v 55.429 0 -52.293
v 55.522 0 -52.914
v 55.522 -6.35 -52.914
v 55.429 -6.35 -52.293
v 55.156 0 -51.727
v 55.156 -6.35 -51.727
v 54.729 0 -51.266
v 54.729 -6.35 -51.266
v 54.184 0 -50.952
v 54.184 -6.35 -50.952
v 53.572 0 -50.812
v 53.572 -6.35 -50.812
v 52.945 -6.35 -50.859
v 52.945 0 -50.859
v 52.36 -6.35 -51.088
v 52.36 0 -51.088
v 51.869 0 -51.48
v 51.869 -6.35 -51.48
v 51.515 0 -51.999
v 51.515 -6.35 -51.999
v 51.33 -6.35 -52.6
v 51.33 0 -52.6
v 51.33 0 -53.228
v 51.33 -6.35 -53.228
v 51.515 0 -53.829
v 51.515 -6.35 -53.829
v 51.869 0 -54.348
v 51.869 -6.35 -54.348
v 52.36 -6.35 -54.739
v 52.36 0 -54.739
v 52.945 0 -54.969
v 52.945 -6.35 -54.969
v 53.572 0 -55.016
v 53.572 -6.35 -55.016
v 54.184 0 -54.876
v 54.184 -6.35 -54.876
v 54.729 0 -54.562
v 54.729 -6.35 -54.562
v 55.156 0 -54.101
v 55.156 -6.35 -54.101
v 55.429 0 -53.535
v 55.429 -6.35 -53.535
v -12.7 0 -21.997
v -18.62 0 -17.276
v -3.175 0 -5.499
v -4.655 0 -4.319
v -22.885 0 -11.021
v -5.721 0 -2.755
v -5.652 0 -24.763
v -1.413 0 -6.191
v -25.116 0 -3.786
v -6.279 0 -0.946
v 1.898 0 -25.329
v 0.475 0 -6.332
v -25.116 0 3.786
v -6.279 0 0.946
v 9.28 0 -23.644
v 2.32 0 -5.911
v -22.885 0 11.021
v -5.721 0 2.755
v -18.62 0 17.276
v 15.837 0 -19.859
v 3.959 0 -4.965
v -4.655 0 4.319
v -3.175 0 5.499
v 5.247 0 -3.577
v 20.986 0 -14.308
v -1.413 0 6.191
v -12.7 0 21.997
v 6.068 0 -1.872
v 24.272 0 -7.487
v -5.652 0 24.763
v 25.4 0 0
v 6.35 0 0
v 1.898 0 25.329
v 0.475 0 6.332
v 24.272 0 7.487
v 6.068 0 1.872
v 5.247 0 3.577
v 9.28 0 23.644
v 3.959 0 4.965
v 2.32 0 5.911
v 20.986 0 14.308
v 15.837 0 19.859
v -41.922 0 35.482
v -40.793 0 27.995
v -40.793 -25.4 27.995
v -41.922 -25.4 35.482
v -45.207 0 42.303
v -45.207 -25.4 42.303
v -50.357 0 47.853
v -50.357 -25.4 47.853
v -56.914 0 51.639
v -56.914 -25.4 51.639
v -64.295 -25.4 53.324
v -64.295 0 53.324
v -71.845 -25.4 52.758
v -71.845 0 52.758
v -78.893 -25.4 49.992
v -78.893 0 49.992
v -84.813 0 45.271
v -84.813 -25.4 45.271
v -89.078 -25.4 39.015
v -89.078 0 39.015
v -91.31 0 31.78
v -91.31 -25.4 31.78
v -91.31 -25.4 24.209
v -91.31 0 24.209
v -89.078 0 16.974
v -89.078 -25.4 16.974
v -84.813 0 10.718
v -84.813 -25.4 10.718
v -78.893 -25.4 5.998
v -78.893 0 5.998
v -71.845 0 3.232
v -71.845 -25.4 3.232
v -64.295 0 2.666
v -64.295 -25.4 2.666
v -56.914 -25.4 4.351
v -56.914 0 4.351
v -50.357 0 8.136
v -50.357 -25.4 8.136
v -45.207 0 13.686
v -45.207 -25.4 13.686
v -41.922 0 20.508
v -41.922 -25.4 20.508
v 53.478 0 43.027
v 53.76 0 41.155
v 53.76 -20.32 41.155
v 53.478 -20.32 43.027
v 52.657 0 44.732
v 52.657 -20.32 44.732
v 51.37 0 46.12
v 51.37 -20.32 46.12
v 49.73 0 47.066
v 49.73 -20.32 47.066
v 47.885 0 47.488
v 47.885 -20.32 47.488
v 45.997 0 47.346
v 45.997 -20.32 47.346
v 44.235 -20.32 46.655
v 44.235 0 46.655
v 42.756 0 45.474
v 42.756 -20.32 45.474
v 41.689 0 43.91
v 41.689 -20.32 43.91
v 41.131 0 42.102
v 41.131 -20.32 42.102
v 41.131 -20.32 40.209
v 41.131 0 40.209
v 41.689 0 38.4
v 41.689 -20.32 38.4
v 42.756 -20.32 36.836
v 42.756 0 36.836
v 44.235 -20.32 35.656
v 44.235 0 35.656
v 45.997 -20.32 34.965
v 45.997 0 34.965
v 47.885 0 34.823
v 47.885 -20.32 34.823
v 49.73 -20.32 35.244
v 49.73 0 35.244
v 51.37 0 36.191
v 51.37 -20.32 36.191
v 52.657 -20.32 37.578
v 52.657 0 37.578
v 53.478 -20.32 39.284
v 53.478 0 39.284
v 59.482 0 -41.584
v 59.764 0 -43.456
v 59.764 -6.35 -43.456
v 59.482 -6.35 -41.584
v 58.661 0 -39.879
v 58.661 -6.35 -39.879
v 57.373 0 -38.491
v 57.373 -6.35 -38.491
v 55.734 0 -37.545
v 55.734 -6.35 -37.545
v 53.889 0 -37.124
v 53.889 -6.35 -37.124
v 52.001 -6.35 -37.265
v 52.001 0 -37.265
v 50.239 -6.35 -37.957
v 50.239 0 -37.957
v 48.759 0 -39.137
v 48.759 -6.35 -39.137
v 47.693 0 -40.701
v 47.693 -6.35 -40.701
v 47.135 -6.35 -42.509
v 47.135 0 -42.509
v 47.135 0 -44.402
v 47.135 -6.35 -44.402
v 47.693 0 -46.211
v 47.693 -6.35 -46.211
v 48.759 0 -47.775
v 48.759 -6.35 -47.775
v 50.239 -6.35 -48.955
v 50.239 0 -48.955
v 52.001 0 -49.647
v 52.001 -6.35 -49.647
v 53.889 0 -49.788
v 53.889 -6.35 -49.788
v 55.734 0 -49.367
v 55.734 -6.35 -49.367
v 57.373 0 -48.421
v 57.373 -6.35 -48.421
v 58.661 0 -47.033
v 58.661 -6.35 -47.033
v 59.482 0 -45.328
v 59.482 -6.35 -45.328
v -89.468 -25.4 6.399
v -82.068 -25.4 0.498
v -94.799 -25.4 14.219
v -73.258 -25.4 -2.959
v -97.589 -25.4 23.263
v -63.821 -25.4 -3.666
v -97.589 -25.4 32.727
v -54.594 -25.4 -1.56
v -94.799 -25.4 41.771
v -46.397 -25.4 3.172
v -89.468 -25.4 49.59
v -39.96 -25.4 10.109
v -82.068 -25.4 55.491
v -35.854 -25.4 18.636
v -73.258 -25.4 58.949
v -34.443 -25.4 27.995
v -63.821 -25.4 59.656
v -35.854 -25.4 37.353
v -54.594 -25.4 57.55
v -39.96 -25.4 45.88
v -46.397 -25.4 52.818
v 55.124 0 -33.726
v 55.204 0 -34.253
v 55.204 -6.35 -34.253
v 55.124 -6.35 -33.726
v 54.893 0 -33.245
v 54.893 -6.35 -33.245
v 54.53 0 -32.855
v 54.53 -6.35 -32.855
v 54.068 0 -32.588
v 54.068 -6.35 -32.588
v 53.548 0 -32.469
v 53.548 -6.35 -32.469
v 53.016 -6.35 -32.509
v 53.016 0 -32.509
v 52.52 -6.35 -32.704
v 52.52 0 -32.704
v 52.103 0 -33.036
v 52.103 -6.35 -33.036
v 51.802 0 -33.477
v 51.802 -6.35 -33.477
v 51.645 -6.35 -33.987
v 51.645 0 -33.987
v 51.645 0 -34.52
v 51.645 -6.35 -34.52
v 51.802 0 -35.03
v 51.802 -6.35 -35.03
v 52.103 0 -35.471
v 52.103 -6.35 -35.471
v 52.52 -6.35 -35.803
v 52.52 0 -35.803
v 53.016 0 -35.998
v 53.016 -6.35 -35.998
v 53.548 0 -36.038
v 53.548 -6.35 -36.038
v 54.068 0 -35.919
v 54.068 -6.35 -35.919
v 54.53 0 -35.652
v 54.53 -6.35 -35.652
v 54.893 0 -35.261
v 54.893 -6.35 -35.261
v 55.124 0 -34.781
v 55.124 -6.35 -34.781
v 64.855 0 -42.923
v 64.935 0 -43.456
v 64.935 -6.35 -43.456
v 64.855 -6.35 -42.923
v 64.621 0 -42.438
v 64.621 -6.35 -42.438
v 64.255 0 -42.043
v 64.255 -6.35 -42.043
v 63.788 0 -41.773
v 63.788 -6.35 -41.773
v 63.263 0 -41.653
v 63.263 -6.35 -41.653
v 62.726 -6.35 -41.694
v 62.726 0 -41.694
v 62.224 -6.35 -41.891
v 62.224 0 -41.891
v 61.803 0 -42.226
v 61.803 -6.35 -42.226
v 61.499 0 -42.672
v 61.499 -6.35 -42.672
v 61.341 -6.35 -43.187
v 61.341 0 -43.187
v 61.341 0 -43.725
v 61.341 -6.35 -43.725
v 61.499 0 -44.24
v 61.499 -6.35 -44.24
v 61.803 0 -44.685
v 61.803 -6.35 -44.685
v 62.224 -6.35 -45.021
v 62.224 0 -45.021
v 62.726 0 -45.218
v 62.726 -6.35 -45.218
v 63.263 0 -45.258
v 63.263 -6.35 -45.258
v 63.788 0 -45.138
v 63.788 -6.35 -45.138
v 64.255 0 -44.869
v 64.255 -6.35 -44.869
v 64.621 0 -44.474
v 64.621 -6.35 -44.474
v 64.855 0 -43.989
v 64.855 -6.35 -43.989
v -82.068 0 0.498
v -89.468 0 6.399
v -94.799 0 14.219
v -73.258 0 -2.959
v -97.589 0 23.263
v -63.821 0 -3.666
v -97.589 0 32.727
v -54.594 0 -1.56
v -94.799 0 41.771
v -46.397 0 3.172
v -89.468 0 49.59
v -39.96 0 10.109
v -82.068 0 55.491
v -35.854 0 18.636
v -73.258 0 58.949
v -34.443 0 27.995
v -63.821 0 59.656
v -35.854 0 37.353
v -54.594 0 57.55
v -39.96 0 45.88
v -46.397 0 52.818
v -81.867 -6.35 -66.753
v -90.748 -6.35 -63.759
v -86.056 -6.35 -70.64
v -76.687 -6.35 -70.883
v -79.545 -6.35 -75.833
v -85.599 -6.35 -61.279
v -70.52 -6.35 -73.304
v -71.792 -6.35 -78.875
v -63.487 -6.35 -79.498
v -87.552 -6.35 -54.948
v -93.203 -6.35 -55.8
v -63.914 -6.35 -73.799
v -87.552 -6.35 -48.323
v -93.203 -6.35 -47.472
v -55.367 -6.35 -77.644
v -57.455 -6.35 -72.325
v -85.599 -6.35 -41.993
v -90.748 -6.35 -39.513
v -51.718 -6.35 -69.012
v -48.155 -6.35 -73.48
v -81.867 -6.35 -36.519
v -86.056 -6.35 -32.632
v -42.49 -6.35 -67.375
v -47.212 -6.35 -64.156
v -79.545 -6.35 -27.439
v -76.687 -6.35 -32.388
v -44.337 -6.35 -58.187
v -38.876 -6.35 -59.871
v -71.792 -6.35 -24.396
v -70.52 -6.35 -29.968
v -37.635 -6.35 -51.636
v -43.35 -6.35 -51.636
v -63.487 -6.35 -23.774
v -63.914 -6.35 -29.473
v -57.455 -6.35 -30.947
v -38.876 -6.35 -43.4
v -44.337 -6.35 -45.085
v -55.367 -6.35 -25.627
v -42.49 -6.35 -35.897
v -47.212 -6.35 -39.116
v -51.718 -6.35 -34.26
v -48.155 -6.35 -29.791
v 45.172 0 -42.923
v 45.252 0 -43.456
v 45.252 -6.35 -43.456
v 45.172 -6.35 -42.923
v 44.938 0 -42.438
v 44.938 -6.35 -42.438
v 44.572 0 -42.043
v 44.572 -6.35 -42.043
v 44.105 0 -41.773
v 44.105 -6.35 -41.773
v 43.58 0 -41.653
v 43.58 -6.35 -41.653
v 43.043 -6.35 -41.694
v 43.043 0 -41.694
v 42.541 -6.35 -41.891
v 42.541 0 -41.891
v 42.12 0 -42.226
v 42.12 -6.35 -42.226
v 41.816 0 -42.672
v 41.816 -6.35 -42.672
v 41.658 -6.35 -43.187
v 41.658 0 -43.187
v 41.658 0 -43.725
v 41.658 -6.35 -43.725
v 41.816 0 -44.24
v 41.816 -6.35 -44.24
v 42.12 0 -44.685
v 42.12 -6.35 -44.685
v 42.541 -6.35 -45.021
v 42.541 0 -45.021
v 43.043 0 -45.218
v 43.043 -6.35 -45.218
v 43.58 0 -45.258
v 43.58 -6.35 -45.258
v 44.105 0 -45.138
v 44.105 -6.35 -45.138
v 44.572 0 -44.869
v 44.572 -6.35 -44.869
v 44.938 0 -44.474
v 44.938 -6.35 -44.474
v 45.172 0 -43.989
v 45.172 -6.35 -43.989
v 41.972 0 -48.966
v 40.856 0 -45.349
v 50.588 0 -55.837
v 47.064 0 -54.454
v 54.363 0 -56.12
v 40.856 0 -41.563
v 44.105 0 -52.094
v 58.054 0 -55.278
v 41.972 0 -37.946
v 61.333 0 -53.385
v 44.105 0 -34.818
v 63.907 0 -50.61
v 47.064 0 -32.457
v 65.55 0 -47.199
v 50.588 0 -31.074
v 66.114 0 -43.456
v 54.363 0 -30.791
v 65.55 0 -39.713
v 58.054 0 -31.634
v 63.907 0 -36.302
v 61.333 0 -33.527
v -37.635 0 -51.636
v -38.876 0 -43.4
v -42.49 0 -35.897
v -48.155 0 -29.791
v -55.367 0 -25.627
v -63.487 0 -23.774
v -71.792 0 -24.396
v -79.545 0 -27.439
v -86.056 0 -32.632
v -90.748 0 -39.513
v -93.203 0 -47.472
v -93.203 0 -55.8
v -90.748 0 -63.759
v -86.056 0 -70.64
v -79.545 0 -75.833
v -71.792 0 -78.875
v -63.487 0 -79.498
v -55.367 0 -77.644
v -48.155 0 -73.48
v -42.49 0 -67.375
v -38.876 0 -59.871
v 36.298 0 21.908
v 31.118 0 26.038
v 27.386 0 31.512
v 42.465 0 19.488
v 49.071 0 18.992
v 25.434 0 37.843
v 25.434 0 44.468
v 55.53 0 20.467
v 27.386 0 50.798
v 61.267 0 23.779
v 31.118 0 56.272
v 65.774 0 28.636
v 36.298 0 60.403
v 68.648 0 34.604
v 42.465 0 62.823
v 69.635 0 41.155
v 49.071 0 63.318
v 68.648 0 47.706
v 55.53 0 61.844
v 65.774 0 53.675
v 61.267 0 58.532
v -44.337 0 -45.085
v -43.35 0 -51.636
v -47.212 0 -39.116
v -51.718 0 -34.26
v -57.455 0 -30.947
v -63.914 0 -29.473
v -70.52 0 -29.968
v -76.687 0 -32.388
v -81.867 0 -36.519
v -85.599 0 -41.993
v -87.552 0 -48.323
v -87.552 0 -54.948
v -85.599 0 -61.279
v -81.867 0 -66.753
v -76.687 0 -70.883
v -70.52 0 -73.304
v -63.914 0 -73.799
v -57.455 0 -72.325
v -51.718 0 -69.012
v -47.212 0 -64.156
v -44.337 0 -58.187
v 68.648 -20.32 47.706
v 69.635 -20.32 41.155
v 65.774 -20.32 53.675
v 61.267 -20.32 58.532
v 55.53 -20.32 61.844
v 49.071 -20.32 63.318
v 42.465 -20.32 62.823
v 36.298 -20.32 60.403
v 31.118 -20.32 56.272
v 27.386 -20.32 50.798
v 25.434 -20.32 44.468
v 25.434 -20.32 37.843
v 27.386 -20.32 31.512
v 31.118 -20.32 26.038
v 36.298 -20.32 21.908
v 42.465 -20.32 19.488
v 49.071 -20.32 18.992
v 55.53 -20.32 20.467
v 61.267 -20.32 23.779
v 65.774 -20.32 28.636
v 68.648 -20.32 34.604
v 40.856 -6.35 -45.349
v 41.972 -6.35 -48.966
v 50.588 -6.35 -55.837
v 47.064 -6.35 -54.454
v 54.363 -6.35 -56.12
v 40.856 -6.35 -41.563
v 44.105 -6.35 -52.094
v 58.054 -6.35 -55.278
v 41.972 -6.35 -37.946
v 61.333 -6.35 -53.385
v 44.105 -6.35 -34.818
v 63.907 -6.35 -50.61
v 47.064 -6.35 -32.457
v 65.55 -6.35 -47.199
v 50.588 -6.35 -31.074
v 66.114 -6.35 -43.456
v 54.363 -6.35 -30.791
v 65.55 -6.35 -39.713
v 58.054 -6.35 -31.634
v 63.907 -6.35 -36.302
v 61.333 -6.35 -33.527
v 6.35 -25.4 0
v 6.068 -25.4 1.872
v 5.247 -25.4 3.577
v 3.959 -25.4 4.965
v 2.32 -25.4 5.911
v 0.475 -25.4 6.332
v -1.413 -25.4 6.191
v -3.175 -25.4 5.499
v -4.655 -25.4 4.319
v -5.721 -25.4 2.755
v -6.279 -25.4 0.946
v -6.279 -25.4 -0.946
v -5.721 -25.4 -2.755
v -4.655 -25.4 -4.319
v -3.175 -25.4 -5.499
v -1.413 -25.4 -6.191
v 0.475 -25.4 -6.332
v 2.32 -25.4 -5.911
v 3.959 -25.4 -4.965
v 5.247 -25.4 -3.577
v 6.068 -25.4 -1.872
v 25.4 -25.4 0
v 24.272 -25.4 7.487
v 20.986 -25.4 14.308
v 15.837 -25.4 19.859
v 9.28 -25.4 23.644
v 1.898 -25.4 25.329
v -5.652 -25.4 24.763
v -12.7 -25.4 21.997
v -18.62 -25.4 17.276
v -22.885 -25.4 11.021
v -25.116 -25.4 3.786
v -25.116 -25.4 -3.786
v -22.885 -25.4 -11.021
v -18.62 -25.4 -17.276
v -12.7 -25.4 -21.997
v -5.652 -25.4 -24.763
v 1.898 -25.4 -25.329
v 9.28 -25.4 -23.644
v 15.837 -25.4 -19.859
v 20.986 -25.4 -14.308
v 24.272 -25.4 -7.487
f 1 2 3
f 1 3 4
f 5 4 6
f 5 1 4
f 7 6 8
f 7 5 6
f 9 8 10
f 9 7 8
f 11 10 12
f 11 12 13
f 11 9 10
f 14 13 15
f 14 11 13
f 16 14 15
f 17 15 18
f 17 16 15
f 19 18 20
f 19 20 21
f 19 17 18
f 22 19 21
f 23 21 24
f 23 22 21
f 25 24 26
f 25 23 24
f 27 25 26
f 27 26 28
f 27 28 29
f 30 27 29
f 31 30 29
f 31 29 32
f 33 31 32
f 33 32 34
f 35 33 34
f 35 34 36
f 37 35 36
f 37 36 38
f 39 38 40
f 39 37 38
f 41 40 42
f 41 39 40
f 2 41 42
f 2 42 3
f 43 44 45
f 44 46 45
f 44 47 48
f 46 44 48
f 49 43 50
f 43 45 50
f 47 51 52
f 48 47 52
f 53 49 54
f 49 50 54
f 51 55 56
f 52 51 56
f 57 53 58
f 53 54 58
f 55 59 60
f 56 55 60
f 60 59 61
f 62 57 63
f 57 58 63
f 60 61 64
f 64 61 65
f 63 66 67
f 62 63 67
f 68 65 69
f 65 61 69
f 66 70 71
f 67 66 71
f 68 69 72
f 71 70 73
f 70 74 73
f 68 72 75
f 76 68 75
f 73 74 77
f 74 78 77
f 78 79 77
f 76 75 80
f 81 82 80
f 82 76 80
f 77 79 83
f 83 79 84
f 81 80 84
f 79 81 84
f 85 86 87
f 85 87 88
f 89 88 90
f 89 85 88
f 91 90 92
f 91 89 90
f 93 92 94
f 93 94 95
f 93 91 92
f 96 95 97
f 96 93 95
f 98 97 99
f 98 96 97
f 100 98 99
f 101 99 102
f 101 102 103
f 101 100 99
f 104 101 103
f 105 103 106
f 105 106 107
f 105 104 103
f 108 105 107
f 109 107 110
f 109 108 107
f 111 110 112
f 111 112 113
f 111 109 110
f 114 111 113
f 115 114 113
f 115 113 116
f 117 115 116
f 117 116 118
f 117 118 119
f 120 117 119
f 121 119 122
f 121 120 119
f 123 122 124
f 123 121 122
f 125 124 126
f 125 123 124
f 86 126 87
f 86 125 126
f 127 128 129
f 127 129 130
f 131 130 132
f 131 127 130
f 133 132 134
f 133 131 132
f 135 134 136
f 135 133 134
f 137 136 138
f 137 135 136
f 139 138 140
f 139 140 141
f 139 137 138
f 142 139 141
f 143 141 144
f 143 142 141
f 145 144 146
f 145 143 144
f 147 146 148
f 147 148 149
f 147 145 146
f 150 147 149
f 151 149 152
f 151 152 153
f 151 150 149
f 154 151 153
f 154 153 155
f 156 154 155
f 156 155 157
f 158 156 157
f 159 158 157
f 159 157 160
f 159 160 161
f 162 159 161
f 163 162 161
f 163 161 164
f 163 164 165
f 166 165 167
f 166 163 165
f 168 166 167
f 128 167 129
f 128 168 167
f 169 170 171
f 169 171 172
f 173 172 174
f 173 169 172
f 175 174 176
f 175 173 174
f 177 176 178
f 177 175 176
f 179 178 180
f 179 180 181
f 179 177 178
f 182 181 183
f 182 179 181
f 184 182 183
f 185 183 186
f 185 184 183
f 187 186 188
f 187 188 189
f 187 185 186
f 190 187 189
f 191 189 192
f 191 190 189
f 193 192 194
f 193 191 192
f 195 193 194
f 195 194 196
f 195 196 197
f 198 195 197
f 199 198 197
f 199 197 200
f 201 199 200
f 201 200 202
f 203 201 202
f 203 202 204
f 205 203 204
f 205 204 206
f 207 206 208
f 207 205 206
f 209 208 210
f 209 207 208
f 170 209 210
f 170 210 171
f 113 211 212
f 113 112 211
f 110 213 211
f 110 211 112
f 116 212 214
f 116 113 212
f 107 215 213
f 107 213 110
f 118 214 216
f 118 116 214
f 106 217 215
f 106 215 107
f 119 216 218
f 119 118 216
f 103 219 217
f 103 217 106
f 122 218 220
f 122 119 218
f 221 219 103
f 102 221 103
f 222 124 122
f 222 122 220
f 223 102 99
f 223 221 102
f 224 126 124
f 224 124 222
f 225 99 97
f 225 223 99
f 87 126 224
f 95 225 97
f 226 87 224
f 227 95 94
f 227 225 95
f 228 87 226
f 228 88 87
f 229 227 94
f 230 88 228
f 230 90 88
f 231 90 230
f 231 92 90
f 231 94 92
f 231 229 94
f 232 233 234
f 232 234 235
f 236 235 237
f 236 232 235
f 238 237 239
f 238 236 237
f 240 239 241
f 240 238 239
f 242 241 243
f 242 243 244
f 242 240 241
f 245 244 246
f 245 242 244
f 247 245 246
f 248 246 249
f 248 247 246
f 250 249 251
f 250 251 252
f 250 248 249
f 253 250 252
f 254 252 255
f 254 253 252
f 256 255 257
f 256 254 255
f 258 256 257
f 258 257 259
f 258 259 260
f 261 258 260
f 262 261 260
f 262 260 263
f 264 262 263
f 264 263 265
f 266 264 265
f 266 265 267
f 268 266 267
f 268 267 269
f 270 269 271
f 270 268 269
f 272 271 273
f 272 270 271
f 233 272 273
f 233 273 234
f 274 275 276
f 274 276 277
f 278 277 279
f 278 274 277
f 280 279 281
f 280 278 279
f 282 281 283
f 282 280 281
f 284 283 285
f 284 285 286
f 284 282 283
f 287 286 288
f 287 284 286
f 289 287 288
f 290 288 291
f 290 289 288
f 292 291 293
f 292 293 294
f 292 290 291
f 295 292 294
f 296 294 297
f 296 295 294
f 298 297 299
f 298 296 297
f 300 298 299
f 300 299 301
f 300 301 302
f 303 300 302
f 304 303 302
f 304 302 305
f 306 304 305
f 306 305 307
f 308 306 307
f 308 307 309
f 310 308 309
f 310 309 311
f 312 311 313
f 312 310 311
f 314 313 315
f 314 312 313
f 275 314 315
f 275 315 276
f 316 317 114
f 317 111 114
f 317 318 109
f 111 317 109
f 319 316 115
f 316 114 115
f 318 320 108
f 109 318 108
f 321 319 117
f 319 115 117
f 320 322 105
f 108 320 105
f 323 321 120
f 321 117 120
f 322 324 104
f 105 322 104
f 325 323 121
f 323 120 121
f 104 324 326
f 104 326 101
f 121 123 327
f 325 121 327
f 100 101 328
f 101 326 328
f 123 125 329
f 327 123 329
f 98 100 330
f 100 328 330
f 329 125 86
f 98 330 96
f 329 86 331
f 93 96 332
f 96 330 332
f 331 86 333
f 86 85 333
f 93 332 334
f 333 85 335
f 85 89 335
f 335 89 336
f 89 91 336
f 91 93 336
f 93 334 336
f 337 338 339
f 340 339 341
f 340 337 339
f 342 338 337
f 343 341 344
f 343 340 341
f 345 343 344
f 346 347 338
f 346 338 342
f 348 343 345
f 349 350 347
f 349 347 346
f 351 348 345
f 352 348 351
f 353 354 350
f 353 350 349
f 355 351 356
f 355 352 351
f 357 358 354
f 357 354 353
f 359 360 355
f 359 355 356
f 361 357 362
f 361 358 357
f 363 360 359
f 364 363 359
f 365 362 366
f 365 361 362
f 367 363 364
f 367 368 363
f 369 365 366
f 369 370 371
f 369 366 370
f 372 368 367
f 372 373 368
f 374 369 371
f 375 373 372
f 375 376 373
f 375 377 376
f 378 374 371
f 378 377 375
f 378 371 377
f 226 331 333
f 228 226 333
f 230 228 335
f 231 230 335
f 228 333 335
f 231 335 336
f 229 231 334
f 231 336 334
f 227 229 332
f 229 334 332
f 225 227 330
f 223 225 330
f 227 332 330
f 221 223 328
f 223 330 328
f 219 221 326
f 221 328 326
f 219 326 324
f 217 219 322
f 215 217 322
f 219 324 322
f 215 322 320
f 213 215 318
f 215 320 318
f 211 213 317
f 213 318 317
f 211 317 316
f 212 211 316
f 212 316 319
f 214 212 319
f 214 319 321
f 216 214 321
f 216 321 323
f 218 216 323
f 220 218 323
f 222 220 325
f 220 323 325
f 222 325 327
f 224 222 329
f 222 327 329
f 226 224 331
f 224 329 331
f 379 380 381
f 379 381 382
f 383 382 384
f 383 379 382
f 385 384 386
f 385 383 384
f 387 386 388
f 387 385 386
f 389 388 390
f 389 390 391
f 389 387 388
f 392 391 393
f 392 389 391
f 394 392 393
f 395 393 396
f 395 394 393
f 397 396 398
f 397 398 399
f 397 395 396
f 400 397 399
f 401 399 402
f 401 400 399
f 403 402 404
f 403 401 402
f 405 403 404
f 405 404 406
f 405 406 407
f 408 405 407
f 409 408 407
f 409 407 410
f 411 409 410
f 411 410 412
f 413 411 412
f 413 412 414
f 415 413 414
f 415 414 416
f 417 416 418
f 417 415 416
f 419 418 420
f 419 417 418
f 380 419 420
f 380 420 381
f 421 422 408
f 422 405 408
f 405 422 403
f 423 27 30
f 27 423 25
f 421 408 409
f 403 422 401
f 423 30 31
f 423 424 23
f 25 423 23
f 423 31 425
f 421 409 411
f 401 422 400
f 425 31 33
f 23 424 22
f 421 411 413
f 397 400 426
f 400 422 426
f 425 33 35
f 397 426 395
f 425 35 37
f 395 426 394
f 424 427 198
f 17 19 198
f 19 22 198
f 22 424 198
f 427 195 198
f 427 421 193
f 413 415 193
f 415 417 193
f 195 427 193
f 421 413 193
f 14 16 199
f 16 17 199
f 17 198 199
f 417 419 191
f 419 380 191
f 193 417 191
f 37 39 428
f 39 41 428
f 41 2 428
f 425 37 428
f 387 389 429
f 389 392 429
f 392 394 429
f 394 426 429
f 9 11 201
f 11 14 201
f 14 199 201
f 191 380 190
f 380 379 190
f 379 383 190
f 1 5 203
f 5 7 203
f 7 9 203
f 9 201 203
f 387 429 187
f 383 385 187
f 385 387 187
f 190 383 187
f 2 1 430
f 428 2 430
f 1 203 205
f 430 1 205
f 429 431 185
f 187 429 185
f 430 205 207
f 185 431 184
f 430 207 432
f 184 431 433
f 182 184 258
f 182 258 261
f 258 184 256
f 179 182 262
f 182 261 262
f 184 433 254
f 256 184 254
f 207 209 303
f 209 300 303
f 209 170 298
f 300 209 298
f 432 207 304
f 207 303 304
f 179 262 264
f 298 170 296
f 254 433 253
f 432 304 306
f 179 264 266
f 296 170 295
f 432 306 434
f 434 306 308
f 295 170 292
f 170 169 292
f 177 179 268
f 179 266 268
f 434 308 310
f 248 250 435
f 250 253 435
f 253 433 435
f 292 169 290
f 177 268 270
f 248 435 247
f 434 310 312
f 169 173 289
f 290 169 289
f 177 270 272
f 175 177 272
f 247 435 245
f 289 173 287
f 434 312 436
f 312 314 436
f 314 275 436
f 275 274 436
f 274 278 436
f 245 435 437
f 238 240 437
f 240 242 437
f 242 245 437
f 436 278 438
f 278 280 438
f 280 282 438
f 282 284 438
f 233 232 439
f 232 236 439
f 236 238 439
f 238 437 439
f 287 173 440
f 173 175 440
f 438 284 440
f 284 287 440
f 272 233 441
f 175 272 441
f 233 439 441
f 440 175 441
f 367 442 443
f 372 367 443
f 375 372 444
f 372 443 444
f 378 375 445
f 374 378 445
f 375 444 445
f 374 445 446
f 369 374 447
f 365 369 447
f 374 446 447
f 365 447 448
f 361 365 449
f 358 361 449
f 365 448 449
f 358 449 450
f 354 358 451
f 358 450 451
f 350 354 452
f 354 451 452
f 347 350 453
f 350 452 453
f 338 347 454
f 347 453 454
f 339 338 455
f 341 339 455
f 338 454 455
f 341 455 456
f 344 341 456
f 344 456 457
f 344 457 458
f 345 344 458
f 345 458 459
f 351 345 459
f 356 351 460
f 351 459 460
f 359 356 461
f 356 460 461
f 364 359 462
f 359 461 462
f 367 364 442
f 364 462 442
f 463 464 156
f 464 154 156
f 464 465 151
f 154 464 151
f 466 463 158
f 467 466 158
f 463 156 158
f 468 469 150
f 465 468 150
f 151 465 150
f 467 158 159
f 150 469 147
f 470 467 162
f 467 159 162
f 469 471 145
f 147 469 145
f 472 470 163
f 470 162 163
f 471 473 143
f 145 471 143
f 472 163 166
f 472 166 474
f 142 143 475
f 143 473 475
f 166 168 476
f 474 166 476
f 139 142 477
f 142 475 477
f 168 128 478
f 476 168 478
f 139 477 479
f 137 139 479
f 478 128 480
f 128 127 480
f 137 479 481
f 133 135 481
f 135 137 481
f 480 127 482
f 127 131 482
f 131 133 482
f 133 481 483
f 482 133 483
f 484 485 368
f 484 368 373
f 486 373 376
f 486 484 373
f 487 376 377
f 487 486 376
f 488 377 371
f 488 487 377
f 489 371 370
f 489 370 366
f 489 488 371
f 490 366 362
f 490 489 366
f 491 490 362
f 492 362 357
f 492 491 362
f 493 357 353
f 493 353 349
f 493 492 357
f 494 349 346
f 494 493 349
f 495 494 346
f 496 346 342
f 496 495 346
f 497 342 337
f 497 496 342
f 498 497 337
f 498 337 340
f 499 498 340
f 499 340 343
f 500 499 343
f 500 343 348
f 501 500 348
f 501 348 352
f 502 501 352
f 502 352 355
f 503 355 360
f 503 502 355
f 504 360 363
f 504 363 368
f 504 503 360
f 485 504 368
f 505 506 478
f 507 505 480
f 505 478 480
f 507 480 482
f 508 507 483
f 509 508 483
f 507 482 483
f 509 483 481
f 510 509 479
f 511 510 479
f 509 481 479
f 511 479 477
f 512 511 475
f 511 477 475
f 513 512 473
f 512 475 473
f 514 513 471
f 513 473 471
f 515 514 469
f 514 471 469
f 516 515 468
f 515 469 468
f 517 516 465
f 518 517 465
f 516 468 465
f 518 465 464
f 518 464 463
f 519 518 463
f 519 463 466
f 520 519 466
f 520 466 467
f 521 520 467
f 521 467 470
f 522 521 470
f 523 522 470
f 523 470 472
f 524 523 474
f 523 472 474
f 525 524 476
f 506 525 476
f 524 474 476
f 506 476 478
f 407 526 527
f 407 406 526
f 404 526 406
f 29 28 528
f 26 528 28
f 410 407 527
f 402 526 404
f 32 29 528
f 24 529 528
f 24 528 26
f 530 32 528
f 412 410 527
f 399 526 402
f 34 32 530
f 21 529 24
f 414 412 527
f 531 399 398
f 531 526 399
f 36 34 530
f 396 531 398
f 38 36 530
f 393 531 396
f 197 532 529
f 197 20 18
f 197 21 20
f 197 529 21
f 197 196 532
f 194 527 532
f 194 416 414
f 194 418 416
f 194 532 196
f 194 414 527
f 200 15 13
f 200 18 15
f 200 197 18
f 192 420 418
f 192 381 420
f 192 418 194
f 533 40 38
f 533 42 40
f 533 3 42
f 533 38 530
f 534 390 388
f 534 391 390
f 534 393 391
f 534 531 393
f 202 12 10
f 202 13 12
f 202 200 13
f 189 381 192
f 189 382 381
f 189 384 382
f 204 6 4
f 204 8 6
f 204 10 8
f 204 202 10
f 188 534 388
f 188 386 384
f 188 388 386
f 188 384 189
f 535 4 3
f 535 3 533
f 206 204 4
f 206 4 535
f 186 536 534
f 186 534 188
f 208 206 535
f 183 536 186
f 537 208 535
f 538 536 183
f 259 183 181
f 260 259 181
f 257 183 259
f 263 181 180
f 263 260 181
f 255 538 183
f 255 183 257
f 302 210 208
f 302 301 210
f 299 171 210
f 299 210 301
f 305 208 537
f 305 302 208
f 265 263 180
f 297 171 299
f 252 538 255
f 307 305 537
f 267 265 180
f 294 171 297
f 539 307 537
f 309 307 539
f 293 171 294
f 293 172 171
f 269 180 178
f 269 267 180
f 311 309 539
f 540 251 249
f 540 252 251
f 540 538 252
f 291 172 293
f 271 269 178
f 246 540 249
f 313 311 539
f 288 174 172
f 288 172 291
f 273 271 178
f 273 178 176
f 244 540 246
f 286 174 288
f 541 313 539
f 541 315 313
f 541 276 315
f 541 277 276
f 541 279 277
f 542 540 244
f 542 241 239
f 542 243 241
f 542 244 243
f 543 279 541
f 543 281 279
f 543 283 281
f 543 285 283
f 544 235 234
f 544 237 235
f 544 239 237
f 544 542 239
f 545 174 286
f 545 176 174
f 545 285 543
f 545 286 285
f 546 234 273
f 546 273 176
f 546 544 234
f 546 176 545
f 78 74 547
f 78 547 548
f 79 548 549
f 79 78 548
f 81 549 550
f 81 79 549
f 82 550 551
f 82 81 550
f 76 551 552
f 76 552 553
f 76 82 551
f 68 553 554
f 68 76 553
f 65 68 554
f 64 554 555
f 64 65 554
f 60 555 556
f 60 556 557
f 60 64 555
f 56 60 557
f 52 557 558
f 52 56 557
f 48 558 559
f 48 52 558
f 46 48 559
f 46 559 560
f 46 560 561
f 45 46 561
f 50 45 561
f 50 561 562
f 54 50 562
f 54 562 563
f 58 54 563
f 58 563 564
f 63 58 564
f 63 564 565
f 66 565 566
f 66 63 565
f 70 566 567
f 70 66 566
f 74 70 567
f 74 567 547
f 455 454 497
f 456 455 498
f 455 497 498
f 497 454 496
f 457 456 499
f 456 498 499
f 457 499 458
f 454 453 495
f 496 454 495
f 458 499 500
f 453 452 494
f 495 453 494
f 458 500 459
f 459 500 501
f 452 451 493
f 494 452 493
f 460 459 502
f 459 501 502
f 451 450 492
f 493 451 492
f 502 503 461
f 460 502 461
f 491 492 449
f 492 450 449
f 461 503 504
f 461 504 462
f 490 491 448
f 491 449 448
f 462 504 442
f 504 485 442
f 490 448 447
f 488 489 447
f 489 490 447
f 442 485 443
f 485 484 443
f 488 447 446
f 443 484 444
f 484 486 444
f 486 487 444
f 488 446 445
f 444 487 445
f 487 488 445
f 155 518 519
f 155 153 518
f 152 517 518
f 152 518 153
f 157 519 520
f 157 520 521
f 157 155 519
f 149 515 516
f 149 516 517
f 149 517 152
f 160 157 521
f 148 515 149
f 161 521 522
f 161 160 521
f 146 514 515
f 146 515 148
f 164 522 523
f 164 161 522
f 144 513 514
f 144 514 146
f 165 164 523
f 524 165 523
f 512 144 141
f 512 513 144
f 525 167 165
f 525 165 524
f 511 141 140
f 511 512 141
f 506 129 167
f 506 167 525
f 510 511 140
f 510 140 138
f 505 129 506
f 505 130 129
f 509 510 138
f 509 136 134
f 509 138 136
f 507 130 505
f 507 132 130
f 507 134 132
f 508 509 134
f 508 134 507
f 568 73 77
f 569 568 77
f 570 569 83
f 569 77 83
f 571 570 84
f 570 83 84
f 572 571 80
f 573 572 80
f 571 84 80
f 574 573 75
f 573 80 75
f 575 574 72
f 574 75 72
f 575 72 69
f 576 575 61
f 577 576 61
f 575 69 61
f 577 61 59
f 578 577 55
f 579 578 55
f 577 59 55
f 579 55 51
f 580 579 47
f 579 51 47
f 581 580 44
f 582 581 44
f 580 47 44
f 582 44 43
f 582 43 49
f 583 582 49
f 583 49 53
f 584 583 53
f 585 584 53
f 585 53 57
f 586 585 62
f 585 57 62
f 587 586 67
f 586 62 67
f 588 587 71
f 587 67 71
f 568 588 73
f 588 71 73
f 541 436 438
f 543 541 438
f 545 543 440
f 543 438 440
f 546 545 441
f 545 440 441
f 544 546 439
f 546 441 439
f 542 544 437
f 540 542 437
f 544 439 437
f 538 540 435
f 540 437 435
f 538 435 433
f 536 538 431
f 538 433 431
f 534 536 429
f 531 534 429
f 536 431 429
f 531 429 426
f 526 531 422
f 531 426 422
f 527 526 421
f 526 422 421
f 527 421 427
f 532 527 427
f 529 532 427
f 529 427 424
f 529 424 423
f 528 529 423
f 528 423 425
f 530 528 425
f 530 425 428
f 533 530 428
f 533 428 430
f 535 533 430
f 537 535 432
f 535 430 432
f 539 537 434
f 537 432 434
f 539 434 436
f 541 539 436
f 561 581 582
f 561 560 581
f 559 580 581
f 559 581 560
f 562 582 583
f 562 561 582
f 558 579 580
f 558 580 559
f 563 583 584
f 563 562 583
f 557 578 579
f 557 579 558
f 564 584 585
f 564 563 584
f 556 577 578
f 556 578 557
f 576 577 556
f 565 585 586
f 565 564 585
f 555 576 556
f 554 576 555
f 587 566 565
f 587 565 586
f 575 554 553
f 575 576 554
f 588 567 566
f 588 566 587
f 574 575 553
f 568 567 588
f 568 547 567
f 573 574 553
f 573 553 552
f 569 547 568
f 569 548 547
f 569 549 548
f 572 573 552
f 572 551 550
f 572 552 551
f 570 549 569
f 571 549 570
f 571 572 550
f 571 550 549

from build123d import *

# Parameters (mm, degrees)
F0_R     = 25.4
F0_R_2   = 6.35
F0_R_3   = 31.75
F1_DEPTH = 25.4
F2_R     = 22.225
F2_R_2   = 6.35
F3_DEPTH = 20.32
F4_R     = 27.94
F4_R_2   = 22.225
F5_DEPTH = 6.35
F6_R     = 12.7
F6_R_2   = 2.107917
F6_R_3   = 1.807523
F6_R_4   = 6.35
F6_R_5   = 1.807533
F6_R_6   = 1.789361
F7_DEPTH = 6.35


with BuildPart() as f1:
    # F0 (on Front) → F1 (new body)
    with BuildSketch(Plane.XZ):
        Circle(F0_R)
        Circle(F0_R_2, mode=Mode.SUBTRACT)
        with Locations((-66.193218, 27.99476)):
            Circle(F0_R_3)
        with Locations((-66.193218, 27.99476)):
            Circle(F0_R, mode=Mode.SUBTRACT)
    extrude(amount=F1_DEPTH)


with BuildPart() as f3:
    # F2 (on Front) → F3 (new body)
    with BuildSketch(Plane.XZ):
        with Locations((47.410432, 41.155305)):
            Circle(F2_R)
        with Locations((47.410432, 41.155305)):
            Circle(F2_R_2, mode=Mode.SUBTRACT)
    extrude(amount=F3_DEPTH)


with BuildPart() as f5:
    # F4 (on Front) → F5 (new body)
    with BuildSketch(Plane.XZ):
        with Locations((-65.574929, -51.635846)):
            Circle(F4_R)
        with Locations((-65.574929, -51.635846)):
            Circle(F4_R_2, mode=Mode.SUBTRACT)
    extrude(amount=F5_DEPTH)


with BuildPart() as f7:
    # F6 (on Front) → F7 (new body)
    with BuildSketch(Plane.XZ):
        with Locations((53.414259, -43.45591)):
            Circle(F6_R)
        with Locations((53.414259, -52.91396)):
            Circle(F6_R_2, mode=Mode.SUBTRACT)
        with Locations((43.444961, -43.45591)):
            Circle(F6_R_3, mode=Mode.SUBTRACT)
        with Locations((53.414259, -43.45591)):
            Circle(F6_R_4, mode=Mode.SUBTRACT)
        with Locations((63.127935, -43.45591)):
            Circle(F6_R_5, mode=Mode.SUBTRACT)
        with Locations((53.414259, -34.253482)):
            Circle(F6_R_6, mode=Mode.SUBTRACT)
    extrude(amount=F7_DEPTH)


solid = Compound([f1.part, f3.part, f5.part, f7.part])
